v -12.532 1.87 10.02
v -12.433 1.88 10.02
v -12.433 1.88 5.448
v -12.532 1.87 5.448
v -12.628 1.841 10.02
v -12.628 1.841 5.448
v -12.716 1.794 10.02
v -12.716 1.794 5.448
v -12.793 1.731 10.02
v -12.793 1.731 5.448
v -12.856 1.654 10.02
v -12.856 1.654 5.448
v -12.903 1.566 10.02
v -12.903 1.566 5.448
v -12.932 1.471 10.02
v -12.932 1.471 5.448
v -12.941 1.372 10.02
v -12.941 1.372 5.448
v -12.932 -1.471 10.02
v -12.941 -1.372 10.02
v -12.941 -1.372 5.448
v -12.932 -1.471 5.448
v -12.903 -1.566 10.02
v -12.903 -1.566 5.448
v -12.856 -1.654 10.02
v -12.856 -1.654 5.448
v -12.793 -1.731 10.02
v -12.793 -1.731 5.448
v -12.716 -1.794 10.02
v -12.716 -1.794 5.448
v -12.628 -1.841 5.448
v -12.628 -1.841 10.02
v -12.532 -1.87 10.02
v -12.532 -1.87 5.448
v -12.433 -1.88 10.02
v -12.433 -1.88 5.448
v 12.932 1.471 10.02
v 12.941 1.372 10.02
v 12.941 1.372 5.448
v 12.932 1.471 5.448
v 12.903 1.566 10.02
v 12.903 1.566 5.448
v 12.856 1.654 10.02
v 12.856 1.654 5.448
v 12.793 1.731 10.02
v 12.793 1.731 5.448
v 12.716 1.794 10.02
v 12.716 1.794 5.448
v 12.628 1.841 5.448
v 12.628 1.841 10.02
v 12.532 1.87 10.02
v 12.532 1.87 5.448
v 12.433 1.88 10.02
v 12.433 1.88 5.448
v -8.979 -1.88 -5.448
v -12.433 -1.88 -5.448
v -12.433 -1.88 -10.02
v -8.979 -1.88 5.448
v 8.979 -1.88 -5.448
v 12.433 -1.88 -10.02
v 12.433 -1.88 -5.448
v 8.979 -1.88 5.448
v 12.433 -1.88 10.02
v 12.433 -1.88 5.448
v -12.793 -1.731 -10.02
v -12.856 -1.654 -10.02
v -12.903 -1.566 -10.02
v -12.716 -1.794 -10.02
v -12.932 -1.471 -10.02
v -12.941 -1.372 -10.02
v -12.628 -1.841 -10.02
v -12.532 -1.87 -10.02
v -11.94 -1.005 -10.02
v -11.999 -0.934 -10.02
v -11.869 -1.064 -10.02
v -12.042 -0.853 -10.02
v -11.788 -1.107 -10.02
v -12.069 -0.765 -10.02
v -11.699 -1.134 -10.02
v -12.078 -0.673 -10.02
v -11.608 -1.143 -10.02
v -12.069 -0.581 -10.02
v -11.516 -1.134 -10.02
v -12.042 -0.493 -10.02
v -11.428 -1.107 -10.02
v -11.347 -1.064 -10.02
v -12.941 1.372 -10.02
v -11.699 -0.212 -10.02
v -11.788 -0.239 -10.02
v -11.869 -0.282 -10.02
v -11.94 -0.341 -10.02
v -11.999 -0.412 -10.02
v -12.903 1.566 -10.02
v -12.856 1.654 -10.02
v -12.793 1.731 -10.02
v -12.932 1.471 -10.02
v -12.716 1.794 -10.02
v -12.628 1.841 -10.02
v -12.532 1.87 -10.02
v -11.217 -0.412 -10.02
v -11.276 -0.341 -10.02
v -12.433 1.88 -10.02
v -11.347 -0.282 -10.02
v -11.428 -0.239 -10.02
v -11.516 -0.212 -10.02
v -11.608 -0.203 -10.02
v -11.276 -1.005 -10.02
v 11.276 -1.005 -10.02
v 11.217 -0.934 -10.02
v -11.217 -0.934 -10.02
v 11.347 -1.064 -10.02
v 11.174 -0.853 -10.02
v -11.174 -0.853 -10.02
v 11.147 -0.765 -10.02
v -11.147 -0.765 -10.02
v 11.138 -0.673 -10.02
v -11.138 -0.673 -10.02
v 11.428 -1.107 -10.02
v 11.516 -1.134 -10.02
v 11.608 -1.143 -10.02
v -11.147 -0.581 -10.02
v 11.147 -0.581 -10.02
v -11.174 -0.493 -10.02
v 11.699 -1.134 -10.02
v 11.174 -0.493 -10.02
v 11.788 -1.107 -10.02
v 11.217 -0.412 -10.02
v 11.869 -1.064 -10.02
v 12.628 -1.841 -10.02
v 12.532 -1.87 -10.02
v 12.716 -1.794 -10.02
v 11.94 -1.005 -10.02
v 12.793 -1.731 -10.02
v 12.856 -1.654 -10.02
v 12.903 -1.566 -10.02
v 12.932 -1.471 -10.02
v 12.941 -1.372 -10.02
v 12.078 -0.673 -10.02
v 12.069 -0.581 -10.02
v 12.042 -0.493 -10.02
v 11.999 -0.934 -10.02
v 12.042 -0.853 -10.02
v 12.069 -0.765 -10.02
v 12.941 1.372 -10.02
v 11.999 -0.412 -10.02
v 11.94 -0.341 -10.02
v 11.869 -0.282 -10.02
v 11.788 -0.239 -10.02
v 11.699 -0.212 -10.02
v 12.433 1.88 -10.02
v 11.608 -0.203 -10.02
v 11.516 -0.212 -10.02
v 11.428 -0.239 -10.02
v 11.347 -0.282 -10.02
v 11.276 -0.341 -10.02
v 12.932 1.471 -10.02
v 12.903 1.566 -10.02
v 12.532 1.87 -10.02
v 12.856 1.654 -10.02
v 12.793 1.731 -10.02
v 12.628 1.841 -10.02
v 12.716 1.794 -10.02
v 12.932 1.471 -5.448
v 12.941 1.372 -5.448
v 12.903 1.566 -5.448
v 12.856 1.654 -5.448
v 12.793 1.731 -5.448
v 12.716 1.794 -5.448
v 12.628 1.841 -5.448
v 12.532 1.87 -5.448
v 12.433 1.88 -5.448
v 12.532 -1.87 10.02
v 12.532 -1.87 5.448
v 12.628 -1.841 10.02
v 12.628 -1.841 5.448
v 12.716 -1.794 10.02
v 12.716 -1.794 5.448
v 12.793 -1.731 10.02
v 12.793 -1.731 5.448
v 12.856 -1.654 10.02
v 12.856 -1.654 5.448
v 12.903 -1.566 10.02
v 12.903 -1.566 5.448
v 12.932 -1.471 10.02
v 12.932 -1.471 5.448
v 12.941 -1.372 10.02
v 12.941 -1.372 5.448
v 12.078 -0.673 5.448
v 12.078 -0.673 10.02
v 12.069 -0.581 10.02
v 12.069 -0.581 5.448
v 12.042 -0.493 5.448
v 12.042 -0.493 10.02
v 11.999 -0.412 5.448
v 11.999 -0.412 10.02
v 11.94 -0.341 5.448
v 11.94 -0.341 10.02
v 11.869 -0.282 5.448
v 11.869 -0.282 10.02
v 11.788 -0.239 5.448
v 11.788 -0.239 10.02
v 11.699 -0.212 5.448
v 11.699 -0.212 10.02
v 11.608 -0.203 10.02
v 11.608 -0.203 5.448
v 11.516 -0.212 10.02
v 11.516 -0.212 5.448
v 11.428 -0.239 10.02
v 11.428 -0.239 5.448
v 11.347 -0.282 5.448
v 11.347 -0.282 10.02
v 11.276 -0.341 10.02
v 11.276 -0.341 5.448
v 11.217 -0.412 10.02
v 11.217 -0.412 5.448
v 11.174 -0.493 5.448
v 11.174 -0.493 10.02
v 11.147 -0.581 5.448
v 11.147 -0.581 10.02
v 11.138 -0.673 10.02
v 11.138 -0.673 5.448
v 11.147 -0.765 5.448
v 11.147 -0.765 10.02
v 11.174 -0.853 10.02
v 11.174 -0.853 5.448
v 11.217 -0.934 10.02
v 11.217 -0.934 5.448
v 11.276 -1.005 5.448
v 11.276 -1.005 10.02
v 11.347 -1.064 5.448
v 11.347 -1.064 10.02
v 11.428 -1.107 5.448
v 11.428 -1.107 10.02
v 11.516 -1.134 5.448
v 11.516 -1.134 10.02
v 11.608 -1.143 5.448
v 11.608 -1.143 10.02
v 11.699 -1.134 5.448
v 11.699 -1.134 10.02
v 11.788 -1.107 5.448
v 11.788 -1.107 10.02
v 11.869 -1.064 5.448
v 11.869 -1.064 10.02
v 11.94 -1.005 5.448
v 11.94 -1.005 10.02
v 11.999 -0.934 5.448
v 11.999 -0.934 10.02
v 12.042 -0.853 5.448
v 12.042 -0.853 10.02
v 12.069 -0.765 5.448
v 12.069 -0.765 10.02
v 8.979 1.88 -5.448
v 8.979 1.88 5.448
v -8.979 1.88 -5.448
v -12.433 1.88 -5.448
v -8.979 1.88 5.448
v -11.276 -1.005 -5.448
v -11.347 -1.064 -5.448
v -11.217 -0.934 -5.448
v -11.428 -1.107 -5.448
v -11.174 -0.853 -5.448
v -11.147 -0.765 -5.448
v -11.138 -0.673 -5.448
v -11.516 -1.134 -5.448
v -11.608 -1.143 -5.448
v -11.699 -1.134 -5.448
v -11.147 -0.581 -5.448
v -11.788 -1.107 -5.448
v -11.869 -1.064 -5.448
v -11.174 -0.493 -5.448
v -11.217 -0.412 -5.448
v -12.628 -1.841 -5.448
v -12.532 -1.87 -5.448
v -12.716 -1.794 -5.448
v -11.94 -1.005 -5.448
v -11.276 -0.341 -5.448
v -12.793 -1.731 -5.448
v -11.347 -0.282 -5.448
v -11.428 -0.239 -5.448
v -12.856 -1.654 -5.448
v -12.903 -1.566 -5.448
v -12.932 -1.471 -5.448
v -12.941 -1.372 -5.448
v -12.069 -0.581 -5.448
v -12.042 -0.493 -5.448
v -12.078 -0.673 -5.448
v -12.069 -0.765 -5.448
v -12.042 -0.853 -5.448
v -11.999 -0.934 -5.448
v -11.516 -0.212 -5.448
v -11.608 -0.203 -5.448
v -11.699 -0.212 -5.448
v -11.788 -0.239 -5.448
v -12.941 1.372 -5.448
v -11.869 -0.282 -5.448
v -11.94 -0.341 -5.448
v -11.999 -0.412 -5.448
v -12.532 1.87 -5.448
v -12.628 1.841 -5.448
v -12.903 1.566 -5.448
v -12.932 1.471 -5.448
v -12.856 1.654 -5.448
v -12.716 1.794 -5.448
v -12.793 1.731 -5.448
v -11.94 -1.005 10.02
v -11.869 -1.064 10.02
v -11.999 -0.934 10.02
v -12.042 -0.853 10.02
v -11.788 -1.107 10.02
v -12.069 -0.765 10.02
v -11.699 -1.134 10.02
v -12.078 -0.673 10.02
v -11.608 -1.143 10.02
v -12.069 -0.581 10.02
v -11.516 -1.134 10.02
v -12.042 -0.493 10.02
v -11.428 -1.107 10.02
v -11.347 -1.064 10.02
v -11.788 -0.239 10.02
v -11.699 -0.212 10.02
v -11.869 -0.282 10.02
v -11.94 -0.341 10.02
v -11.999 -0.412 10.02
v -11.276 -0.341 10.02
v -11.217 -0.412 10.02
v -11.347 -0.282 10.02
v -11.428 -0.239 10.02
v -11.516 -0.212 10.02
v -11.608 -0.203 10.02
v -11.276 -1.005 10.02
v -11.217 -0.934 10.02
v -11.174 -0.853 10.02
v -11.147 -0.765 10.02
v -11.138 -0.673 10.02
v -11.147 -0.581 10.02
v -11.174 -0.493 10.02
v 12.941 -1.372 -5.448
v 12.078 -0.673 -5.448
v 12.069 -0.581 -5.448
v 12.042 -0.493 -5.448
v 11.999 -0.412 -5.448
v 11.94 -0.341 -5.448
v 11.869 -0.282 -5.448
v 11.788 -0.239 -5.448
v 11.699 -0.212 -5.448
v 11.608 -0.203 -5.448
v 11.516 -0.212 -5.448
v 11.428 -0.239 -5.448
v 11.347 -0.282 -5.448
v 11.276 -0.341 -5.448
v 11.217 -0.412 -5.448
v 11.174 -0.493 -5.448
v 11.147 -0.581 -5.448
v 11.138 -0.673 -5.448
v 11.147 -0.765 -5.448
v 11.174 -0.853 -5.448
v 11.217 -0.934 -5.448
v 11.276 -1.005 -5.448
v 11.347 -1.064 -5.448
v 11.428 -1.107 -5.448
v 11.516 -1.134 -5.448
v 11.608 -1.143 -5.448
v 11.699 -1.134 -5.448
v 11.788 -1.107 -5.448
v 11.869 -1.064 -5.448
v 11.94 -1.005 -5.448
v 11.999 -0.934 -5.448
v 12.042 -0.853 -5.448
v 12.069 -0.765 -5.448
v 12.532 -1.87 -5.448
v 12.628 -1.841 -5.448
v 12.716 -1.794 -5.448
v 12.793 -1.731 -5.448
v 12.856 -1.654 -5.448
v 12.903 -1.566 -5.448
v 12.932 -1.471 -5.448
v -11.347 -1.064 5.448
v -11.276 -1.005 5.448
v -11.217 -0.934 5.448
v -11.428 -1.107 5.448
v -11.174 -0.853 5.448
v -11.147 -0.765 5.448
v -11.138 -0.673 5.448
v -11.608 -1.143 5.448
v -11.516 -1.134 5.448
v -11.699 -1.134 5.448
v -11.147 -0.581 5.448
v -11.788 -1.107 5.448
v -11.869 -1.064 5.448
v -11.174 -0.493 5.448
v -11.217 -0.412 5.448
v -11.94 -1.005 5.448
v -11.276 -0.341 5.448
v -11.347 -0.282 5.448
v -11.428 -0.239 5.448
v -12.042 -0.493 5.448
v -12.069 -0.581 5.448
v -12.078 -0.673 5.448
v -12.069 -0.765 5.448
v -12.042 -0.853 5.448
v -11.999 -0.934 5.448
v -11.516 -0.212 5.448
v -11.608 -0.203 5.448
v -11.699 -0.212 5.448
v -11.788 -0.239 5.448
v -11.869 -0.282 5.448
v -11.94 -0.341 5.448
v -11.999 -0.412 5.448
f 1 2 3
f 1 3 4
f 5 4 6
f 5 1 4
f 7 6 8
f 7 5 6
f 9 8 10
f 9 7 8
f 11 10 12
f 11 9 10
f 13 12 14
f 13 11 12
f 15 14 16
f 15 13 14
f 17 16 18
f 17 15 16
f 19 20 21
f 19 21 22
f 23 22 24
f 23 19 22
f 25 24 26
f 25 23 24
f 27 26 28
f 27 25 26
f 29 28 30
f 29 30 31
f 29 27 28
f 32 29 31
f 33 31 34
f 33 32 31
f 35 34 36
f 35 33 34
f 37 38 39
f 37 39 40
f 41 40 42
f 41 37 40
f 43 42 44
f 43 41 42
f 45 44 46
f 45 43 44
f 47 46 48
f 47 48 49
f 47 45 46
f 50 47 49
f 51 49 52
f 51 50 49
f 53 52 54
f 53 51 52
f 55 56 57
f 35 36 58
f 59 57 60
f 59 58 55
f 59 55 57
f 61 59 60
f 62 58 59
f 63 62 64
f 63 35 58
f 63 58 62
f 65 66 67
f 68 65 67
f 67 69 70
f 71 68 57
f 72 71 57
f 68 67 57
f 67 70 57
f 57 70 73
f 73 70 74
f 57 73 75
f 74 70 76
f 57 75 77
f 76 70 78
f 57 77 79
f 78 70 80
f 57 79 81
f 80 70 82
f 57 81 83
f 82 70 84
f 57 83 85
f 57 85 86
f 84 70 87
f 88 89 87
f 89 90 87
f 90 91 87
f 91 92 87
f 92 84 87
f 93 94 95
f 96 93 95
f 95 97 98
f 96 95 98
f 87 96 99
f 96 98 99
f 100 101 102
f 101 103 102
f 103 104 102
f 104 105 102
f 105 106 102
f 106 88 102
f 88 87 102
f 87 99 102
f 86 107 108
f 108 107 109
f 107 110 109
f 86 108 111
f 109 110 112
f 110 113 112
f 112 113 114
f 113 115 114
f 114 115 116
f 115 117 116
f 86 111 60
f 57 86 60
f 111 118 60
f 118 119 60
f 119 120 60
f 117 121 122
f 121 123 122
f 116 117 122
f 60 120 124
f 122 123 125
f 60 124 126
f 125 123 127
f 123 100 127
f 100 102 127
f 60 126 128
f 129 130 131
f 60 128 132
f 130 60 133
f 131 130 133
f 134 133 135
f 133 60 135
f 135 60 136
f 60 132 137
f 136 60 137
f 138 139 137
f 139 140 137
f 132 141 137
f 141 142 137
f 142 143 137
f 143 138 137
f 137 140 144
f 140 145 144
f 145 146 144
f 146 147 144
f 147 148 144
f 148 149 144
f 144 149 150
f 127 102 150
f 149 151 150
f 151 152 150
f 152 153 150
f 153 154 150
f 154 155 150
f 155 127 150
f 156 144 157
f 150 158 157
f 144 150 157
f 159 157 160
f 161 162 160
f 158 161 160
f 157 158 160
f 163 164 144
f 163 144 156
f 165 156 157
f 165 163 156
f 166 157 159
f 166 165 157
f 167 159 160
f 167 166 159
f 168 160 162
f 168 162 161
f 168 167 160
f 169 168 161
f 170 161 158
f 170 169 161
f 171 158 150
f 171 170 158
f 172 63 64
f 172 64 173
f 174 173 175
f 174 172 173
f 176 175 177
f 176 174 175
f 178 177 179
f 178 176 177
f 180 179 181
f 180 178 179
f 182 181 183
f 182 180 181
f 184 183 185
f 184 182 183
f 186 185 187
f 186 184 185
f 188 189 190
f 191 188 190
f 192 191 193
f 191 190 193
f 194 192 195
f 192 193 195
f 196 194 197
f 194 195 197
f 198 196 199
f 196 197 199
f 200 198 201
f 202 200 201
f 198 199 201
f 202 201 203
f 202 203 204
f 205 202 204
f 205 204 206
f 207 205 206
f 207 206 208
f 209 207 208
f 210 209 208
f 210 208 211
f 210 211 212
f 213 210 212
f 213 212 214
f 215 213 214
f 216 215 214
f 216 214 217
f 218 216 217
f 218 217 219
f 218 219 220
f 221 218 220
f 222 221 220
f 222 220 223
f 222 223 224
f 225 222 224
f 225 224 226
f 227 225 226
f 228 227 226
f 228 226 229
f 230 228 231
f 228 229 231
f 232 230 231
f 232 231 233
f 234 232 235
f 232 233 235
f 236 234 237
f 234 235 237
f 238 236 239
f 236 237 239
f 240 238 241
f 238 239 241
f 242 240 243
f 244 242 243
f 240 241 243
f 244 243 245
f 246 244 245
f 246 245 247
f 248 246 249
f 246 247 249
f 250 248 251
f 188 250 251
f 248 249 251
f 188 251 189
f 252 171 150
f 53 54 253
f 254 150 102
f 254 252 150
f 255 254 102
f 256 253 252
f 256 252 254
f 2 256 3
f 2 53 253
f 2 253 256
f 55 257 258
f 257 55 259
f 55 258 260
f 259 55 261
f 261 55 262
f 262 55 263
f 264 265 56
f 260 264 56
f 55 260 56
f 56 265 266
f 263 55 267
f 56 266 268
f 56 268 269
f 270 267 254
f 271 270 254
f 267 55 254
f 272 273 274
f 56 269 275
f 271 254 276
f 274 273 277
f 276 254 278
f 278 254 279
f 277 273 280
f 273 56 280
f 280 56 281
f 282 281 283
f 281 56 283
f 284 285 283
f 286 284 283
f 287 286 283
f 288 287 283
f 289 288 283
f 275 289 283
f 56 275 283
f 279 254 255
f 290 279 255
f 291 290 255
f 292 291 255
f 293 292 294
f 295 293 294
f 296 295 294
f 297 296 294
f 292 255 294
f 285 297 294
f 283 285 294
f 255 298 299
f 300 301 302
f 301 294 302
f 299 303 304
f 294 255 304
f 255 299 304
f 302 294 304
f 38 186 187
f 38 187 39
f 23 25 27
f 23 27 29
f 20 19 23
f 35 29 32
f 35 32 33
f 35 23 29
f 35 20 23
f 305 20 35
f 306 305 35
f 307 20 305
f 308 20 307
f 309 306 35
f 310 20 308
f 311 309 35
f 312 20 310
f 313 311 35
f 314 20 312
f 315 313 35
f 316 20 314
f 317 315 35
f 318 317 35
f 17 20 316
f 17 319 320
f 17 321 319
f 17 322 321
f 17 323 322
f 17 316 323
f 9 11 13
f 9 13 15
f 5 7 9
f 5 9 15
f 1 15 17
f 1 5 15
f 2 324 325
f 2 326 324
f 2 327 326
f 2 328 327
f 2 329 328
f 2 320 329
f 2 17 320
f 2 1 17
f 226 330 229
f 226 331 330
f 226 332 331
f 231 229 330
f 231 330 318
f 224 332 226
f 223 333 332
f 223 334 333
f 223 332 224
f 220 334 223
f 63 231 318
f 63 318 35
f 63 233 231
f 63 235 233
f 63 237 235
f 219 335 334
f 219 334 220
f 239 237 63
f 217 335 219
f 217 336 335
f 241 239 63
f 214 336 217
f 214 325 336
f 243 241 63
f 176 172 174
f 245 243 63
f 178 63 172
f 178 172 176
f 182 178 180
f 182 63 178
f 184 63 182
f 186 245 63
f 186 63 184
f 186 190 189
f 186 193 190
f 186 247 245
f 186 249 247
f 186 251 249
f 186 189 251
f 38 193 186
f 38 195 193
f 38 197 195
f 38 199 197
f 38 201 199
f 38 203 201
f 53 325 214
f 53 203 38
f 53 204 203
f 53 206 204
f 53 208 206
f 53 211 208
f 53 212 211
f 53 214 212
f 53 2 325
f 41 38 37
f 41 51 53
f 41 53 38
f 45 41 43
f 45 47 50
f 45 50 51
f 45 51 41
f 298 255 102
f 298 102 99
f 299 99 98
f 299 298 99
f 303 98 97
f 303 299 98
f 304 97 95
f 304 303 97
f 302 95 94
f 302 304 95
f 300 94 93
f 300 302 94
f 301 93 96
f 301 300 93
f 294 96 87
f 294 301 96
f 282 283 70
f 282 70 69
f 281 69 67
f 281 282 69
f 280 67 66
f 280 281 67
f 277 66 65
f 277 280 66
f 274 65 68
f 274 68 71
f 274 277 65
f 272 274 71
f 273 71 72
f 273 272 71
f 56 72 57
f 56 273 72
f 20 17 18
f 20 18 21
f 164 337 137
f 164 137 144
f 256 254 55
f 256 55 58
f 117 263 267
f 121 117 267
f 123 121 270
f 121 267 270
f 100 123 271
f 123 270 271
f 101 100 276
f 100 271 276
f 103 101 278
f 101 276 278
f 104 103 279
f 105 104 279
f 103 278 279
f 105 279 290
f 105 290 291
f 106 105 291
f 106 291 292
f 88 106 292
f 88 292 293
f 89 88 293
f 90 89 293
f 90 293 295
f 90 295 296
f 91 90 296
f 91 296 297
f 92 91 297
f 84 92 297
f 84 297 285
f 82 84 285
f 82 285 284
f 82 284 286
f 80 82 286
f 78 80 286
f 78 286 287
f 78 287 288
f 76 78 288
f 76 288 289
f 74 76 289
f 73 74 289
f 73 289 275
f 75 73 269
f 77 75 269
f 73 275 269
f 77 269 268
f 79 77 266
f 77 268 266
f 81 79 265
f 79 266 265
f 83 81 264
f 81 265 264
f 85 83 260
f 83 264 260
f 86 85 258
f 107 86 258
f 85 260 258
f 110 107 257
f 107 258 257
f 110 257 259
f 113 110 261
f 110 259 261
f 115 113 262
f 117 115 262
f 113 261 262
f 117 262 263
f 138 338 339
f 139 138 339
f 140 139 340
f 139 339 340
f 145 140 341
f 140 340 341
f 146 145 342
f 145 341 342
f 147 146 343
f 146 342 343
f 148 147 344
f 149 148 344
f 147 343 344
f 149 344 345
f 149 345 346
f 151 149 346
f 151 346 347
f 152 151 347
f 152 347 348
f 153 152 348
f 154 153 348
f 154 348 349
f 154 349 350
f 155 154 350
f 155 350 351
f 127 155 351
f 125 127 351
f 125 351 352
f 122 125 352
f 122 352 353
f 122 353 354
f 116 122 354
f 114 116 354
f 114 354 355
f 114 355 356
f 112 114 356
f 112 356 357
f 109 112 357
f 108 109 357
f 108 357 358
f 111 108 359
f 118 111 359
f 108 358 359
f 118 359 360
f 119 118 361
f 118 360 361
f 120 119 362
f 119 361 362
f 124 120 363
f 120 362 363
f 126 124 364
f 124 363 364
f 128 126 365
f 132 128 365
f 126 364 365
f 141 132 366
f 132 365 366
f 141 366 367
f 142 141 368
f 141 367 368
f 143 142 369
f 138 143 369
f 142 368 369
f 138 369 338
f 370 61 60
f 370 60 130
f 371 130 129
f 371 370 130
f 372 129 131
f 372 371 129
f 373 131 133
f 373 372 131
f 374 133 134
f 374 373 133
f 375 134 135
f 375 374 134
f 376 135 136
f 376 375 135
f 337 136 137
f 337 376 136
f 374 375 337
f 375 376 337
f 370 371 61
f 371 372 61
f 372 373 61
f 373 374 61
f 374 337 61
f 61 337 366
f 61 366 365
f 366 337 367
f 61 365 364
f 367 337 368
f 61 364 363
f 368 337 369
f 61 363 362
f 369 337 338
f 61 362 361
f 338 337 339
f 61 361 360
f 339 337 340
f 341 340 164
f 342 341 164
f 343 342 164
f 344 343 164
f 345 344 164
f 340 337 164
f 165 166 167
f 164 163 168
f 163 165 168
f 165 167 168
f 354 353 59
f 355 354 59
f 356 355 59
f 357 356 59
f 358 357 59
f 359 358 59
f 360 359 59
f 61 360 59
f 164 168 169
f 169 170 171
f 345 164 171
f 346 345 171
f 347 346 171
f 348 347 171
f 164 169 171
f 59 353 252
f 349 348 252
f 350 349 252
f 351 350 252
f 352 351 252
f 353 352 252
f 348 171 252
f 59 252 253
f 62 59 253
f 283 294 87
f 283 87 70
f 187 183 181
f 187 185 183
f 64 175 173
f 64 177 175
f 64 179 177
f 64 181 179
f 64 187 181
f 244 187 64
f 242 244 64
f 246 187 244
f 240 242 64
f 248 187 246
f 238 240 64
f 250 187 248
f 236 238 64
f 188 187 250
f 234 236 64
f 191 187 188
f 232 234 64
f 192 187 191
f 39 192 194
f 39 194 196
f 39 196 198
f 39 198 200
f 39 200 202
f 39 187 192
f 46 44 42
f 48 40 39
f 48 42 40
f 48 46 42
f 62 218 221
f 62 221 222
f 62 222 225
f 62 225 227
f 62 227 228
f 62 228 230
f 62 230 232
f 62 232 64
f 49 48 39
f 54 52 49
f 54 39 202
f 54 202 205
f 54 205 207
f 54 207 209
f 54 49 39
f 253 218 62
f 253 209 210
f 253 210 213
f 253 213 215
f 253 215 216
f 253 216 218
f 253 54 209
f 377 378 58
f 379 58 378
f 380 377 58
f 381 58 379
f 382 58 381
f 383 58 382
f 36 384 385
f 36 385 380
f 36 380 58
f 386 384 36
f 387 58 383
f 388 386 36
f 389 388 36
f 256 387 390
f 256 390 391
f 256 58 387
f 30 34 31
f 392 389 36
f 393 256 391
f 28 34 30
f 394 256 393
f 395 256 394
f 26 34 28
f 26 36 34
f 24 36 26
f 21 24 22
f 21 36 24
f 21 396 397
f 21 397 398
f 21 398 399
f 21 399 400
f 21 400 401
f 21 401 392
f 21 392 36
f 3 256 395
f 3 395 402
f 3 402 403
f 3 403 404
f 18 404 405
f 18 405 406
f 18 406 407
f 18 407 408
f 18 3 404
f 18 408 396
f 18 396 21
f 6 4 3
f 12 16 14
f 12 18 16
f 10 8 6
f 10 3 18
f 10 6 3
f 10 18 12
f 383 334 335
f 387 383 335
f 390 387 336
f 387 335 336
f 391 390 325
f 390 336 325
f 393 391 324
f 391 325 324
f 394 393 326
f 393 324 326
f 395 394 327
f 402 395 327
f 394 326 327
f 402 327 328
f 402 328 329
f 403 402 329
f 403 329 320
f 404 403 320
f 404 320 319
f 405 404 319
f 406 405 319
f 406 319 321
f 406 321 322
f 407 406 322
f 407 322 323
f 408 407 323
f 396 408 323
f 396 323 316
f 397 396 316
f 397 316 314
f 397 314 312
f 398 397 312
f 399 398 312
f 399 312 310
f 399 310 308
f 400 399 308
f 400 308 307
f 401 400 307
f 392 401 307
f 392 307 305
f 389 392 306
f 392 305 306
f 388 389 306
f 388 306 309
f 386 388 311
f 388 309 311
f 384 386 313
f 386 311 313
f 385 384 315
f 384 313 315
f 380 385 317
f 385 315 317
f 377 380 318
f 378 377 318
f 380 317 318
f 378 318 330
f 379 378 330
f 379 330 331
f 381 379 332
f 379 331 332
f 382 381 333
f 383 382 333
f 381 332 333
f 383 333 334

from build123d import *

# Parameters (mm, degrees)
F1_DEPTH = 10.0203
F2_R     = 0.4699
F3_DEPTH = 25.4
F4_W     = 3.9624
F4_H     = 10.8966
F5_DEPTH = 25.4


with BuildPart() as f1:
    # F0 (on Top) → F1 (new body, symmetric)
    with BuildSketch(Plane.XY):
        with BuildLine():
            ThreePointArc((-12.9413, -1.3716), (-12.79251, -1.73081), (-12.4333, -1.8796))
            Line((-12.4333, -1.8796), (12.4333, -1.8796))
            ThreePointArc((12.4333, -1.8796), (12.79251, -1.73081), (12.9413, -1.3716))
            Line((12.9413, -1.3716), (12.9413, 1.3716))
            ThreePointArc((12.9413, 1.3716), (12.79251, 1.73081), (12.4333, 1.8796))
            Line((12.4333, 1.8796), (-12.4333, 1.8796))
            ThreePointArc((-12.4333, 1.8796), (-12.79251, 1.73081), (-12.9413, 1.3716))
            Line((-12.9413, 1.3716), (-12.9413, -1.3716))
        make_face()
    extrude(amount=F1_DEPTH, both=True)

    # F2 (on face) → F3 (cut)
    with BuildSketch(Plane.XY.offset(10.0203)):
        with Locations((11.6078, -0.6731)):
            Circle(F2_R)
        with Locations((-11.6078, -0.6731)):
            Circle(F2_R)
    extrude(amount=-F3_DEPTH, mode=Mode.SUBTRACT)

    # F4 (on face) → F5 (cut)
    with BuildSketch(Plane(origin=(0, 1.8796, 0), x_dir=(-1, 0, 0), z_dir=(0, 1, 0))):
        with Locations((-10.9601, 0)):
            Rectangle(F4_W, F4_H)
        with Locations((10.9601, 0)):
            Rectangle(F4_W, F4_H)
    extrude(amount=-F5_DEPTH, mode=Mode.SUBTRACT)


solid = f1.part
